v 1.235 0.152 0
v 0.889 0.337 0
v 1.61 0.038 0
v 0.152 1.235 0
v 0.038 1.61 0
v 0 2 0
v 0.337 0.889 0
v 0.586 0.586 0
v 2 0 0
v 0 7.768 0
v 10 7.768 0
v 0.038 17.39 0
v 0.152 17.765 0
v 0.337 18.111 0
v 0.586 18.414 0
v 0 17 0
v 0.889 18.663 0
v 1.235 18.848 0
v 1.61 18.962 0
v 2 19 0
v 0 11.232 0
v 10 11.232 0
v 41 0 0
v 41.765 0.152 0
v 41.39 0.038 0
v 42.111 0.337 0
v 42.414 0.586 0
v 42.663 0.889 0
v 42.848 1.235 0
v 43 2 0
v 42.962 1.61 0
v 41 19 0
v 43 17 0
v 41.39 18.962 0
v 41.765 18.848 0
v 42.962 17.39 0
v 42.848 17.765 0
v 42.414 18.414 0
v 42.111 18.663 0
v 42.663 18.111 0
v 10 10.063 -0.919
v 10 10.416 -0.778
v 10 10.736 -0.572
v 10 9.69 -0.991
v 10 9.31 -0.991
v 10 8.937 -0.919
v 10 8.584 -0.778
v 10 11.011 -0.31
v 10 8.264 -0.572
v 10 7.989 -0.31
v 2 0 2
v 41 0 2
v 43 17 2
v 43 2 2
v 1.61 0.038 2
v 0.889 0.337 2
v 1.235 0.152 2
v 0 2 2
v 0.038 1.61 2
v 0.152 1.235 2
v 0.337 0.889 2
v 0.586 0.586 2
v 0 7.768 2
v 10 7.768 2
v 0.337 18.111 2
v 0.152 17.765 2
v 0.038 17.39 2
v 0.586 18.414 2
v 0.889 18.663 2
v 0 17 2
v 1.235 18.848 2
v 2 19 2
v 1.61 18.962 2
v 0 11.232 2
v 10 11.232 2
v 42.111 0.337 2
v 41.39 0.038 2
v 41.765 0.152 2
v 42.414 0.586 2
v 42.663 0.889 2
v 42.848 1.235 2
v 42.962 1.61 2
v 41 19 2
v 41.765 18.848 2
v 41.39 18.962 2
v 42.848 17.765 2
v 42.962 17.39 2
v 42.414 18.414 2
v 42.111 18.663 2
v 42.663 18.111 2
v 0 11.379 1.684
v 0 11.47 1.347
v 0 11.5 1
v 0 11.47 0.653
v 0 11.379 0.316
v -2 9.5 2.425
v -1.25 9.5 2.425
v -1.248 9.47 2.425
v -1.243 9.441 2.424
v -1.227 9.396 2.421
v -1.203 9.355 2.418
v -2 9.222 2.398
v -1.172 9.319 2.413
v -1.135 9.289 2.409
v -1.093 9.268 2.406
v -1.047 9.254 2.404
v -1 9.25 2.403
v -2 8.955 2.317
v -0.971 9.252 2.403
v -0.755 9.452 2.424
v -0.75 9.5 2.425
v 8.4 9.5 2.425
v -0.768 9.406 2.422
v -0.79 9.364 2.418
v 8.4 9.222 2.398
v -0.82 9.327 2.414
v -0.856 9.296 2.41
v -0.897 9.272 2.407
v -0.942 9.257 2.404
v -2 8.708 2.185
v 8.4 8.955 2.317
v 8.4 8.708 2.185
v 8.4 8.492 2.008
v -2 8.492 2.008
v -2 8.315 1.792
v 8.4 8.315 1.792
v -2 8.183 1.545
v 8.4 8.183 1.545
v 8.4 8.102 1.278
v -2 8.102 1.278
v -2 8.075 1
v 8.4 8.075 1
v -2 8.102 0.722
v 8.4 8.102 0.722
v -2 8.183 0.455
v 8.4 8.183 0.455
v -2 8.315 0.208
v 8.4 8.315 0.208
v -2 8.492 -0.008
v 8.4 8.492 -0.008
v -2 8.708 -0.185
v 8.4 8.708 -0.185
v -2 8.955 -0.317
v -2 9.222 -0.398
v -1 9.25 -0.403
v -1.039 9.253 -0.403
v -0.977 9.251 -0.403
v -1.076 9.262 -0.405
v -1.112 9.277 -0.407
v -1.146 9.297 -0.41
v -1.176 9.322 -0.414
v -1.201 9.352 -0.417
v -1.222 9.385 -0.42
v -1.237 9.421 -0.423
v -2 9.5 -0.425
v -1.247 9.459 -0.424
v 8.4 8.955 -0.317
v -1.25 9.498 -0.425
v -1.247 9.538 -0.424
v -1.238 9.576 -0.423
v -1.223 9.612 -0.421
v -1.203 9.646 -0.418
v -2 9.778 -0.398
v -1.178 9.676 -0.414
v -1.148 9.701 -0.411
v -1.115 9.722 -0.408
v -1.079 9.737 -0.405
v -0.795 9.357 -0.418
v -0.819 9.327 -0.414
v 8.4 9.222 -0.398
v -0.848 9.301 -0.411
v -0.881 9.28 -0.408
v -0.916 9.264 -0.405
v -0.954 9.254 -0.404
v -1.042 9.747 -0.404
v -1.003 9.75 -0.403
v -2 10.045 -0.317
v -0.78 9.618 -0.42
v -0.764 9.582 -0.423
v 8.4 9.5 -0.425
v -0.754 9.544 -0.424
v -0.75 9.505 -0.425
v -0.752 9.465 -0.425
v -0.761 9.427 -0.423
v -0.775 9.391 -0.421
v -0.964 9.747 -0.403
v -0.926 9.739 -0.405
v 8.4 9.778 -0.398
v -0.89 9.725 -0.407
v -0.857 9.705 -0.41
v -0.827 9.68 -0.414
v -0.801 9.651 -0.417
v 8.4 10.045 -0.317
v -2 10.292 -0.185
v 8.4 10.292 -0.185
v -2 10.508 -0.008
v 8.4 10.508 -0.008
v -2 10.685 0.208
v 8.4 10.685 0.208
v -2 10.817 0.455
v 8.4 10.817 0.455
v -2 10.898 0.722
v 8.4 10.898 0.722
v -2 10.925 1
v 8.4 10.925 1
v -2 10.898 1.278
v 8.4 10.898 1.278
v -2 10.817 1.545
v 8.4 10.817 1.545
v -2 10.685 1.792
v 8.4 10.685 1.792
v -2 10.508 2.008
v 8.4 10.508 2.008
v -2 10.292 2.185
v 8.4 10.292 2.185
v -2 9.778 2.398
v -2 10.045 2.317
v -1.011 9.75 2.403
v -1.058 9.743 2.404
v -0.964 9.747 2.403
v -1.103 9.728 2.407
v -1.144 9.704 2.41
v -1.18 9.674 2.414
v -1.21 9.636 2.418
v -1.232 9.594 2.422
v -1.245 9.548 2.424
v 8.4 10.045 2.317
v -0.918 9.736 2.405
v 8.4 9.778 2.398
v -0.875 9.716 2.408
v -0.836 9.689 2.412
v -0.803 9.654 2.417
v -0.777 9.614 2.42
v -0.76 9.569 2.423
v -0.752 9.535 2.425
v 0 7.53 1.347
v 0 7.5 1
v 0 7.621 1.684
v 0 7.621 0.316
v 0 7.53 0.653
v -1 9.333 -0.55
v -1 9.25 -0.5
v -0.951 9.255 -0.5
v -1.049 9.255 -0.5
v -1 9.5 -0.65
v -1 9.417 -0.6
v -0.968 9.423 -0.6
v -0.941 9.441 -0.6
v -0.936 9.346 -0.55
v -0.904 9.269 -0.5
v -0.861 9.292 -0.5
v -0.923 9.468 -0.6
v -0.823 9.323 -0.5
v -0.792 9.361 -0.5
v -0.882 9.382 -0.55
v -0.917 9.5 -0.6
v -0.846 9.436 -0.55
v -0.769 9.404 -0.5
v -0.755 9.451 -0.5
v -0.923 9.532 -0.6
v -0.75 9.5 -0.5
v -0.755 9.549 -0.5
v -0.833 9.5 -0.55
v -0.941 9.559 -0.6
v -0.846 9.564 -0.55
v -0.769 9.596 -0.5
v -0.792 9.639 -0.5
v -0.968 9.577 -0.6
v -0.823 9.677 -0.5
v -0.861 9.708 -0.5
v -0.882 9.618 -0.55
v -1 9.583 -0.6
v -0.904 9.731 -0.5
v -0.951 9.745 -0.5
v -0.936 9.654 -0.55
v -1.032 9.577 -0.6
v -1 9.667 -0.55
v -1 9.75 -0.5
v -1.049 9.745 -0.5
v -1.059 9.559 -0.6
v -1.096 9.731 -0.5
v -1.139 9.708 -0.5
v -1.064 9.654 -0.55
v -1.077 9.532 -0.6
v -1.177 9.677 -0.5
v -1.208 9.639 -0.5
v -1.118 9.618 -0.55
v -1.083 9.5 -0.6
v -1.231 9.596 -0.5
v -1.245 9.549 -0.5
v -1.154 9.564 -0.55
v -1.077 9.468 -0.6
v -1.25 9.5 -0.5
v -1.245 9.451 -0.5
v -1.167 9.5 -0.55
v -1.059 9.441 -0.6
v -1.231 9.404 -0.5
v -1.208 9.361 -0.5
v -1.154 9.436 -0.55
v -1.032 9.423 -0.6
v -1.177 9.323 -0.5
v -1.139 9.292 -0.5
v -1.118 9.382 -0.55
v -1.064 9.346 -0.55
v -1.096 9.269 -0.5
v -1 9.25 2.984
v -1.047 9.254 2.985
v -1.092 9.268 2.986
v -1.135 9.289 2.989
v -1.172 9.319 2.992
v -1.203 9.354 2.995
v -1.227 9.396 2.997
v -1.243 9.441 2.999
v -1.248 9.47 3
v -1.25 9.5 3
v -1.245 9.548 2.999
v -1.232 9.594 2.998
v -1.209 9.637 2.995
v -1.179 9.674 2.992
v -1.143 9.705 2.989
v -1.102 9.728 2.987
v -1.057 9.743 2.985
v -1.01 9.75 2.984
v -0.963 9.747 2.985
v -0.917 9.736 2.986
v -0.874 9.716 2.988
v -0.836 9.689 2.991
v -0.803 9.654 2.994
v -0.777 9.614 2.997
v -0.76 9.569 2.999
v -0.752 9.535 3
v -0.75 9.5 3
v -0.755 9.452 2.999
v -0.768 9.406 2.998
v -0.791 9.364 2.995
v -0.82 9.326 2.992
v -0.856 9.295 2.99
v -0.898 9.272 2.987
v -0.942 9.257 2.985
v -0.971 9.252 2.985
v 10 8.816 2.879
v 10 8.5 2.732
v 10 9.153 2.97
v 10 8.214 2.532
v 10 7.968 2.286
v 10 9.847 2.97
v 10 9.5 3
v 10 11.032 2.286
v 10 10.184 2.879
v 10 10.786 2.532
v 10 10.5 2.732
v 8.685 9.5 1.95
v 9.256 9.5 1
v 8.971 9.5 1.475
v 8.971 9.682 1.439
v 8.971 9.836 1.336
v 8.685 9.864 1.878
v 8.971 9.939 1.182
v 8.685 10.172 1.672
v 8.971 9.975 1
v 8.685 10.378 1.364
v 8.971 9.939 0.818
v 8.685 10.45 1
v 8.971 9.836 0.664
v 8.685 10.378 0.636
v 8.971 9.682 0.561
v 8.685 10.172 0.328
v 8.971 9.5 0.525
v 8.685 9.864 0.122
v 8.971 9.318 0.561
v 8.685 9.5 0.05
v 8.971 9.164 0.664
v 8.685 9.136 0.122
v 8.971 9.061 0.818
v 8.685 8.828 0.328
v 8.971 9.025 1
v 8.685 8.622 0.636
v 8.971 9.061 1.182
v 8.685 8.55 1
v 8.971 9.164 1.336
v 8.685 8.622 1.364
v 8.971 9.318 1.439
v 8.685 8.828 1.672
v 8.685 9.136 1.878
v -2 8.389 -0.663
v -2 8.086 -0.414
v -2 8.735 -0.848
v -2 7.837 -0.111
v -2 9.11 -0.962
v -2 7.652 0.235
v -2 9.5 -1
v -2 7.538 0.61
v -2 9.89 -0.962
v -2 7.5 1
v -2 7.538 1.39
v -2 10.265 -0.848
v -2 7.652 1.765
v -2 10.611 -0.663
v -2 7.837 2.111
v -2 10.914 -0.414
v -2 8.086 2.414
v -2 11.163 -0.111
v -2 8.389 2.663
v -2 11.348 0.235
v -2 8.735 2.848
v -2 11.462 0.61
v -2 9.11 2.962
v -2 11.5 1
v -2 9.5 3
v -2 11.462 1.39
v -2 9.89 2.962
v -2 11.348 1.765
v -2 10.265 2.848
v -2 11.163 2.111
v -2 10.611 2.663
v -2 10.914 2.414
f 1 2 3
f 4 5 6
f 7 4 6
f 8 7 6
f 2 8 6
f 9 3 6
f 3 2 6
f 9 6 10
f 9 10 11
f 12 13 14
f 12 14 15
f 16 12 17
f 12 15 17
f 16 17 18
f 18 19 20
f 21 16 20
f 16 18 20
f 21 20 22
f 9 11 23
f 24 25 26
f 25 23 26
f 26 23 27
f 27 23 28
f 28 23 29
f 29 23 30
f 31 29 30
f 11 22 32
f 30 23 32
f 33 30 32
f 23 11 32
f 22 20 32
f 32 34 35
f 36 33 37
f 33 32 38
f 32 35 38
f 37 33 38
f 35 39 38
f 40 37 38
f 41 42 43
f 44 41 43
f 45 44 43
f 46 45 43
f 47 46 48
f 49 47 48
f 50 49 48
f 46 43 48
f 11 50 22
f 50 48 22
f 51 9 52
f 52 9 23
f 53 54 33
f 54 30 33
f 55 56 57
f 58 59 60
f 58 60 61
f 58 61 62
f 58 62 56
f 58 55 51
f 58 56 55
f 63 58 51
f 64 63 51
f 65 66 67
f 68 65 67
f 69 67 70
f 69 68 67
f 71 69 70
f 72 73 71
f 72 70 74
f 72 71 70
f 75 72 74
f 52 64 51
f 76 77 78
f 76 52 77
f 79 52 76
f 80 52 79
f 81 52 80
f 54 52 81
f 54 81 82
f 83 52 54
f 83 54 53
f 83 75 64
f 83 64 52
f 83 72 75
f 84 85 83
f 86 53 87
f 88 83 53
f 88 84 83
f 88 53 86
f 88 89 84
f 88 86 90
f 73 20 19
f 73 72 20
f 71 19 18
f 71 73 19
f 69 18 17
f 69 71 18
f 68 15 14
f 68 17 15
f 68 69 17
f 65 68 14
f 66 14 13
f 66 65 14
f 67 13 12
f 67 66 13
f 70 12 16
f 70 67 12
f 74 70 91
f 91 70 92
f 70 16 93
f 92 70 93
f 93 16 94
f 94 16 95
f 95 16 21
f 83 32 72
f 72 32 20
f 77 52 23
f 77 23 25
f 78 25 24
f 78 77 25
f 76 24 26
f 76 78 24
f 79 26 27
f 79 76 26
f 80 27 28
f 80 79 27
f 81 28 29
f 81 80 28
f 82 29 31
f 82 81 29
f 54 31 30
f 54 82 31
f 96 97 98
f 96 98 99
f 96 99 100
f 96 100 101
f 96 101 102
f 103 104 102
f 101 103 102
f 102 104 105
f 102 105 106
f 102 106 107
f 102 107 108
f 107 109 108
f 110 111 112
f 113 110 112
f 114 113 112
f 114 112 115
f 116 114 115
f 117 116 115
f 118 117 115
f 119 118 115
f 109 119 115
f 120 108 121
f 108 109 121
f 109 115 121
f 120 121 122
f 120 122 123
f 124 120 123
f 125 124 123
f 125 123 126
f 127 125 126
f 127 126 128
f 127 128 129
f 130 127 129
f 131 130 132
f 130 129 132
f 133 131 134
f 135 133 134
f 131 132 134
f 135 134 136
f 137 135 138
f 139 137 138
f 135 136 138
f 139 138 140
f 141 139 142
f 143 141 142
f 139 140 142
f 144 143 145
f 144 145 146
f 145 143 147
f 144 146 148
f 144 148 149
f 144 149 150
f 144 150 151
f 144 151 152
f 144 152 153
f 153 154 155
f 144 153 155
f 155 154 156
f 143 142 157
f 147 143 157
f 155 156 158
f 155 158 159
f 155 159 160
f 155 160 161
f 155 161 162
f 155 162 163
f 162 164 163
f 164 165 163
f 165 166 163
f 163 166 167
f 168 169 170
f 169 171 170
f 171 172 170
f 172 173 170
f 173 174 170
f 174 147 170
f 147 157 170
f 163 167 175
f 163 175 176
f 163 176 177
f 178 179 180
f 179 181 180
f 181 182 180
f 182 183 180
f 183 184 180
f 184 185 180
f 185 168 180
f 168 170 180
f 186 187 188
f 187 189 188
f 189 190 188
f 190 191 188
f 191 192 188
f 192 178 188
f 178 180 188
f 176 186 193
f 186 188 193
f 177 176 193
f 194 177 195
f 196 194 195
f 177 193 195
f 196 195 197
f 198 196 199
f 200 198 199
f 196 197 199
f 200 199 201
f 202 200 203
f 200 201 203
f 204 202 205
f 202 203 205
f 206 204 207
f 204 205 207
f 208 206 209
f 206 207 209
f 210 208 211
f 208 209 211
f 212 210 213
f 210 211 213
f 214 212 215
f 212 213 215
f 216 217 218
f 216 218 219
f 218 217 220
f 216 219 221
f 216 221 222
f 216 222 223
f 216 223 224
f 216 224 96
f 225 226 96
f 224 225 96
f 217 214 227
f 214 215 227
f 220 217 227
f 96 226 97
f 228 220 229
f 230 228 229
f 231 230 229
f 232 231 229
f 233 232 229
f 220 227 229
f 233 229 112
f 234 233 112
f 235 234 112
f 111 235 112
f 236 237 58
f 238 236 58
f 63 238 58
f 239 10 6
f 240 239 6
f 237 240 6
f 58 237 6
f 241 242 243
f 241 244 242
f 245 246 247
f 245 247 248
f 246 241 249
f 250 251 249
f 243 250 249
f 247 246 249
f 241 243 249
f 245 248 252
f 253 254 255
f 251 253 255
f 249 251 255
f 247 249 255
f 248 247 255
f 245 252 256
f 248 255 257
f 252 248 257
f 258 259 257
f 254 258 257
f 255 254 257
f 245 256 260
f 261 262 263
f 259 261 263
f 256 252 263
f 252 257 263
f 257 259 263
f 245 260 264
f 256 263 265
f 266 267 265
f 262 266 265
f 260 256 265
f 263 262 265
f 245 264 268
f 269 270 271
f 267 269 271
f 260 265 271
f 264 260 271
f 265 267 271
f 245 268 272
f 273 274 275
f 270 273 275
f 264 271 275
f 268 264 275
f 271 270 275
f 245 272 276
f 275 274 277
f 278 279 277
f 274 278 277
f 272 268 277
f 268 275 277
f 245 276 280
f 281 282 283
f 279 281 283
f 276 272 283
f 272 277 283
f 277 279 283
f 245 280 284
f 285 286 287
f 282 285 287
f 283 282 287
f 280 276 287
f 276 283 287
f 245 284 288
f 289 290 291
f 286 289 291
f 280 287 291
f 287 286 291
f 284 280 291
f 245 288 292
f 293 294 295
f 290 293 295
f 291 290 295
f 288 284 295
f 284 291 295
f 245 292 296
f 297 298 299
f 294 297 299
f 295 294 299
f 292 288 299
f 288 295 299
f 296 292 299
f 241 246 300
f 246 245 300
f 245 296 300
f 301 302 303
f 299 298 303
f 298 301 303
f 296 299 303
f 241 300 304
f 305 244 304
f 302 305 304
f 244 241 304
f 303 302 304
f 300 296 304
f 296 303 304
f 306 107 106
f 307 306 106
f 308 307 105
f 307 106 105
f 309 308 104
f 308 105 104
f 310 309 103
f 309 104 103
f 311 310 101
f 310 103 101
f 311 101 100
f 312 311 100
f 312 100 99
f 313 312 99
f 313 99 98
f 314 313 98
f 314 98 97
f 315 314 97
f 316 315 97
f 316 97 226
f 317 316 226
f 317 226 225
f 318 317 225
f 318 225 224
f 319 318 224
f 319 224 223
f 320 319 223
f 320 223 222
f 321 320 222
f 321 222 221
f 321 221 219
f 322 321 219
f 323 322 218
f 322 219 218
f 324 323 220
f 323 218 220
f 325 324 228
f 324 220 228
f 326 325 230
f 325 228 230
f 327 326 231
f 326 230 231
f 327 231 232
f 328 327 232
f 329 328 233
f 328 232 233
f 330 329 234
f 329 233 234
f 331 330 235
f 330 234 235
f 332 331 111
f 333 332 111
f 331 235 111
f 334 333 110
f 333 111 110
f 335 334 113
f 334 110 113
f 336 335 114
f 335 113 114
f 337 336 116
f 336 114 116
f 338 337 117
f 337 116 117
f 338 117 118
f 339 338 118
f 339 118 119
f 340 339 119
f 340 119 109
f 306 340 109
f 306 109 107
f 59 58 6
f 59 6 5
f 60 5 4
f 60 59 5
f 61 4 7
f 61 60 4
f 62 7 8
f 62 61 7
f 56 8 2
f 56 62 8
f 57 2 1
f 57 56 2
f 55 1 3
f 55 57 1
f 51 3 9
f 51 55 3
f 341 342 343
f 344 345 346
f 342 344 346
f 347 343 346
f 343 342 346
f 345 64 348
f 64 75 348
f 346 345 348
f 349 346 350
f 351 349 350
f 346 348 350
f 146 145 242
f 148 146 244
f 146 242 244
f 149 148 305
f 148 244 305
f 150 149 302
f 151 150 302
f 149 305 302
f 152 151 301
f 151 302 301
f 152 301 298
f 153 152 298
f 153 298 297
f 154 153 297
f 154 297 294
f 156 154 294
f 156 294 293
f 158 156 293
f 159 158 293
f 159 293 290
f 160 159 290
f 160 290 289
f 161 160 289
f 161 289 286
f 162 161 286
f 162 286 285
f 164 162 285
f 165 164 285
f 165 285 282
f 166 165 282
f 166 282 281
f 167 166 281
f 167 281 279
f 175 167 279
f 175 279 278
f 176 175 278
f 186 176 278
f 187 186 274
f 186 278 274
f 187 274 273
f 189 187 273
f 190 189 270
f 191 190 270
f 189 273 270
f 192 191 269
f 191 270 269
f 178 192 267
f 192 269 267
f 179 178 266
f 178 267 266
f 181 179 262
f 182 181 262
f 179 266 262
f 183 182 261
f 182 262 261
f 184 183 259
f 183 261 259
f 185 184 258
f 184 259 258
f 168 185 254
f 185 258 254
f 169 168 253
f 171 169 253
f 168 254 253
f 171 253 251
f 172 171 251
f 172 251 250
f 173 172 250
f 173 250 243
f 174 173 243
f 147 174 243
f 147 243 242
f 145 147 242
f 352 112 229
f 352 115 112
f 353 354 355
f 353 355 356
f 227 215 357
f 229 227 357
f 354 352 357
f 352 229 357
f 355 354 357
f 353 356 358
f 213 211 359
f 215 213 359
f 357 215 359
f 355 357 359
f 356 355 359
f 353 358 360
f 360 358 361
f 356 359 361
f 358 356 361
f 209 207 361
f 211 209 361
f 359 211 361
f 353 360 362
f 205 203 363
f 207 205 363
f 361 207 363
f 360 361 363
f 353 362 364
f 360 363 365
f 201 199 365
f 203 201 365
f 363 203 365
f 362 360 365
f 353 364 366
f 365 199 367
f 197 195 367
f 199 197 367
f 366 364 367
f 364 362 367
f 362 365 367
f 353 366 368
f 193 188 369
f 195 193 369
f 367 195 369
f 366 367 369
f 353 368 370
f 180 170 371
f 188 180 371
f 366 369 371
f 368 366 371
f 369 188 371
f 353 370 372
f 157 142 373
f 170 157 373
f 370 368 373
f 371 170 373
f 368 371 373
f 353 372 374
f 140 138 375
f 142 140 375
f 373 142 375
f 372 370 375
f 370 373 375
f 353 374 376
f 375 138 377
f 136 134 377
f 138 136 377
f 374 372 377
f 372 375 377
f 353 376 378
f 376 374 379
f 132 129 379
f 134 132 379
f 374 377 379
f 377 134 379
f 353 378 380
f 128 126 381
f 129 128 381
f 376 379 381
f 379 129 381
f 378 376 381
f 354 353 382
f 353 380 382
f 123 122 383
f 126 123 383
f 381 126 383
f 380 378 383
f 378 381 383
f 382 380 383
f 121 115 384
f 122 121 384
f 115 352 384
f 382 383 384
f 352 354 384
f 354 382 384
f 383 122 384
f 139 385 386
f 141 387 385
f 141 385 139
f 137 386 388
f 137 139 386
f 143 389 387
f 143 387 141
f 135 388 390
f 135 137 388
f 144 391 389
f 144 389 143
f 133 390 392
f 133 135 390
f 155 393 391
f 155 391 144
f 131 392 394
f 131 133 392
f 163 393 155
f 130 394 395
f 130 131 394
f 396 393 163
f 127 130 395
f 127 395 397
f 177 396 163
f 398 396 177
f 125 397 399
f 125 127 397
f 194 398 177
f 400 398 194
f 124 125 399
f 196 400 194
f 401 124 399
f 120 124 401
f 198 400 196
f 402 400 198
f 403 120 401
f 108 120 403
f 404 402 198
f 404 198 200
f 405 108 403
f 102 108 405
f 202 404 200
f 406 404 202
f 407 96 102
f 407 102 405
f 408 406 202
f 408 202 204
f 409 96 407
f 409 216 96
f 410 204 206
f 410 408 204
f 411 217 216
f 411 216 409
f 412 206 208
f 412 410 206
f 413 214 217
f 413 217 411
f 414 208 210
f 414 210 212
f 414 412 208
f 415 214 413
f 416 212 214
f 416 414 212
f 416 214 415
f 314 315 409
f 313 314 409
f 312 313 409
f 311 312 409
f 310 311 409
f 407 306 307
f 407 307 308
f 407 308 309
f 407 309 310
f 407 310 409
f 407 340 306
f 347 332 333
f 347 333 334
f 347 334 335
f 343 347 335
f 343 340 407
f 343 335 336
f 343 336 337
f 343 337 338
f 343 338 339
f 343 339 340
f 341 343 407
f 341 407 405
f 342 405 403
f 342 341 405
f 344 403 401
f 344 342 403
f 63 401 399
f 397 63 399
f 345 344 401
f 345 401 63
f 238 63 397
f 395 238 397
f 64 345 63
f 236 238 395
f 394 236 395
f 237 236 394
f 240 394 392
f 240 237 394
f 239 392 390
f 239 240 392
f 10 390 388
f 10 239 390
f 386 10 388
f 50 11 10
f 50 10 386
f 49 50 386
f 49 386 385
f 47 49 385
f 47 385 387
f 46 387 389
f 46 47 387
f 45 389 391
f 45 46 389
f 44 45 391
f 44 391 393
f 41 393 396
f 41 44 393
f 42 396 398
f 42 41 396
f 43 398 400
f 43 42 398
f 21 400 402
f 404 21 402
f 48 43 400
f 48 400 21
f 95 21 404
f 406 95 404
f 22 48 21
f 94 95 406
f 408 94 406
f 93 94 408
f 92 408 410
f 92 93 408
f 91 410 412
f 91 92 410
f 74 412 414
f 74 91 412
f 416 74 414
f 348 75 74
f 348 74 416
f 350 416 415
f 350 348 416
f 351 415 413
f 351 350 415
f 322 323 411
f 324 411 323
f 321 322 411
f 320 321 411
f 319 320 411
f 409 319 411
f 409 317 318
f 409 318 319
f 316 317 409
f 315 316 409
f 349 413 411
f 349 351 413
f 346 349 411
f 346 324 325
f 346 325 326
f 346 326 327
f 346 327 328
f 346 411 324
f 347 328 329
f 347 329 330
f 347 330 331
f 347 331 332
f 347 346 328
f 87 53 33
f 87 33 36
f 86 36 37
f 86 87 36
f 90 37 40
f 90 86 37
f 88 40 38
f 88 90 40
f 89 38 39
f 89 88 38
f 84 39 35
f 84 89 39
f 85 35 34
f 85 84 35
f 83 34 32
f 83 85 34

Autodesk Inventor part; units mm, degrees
ref_plane "YZ Plane" through (0, 0, 0) normal (1, 0, 0) x (0, 1, 0)
ref_plane "XZ Plane" through (0, 0, 0) normal (0, 1, 0) x (-1, 0, 0)
sketch "Sketch1" plane through (0, 0, 0) normal (0, 0, 1) x (1, 0, 0)
  line L0 (0, 0) -> (43, 0)
  line L1 (43, 0) -> (43, 19)
  line L2 (43, 19) -> (0, 19)
  line L3 (0, 19) -> (0, 0)
  dimension "d0" = 43
extrude "Extrusion1" add sketch "Sketch1" along normal blind 2
fillet "Fillet1" radius 2 4 edges at (43, 19, 1) (43, 0, 1) (0, 19, 1) (0, 0, 1)
sketch "Sketch3" plane through (0, 2, 0) normal (-1, 0, 0) x (0, 0, 1)
  line L0 (2, 0) -> (0, 0) construction
  line L1 (2, 15) -> (2, 0) construction
  line L2 (0, 0) -> (2, 15) construction
  line L3 (0, 15) -> (2, 0) construction
  circle A0 centre (1, 7.5) radius 2
  point P0 (0, -2)
  dimension "d4" = 4
extrude "Extrusion2" add sketch "Sketch3" along normal blind 2 and the other way blind 10
sketch "Sketch4" plane through (-2, 9.5, 1) normal (-1, 0, 0) x (0, 0, 1)
  point P0 (-1, -9.5)
  point P1 (0, 0)
hole "Hole1" at (-2, 9.5, 1) direction (1, 0, 0) diameter 2.85 depth 10.4 tip angle 118 thread size "M3.5x0.6" class "6H" standard "ANSI Metric M Profile"
ref_plane "Work Plane2" through (0, 0, 3) normal (0, 0, 1) x (1, 0, 0)
ref_plane "Work Plane1" through (0, 0, 1) normal (0, 0, 1) x (1, 0, 0)
sketch "Sketch6" plane through (0, 0, 3) normal (0, 0, 1) x (1, 0, 0)
  line L0 (-2, 11.5) -> (-2, 7.5) construction
  line L1 (0, 7.5) -> (0, 7.7679) construction
  line L2 (-2, 11.5) -> (0, 7.5) construction
  line L3 (0, 7.5) -> (-2, 7.5) construction
  line L4 (-2, 7.5) -> (0, 11.5) construction
  line L5 (0, 11.5) -> (-2, 11.5) construction
  point P0 (0, 0)
  point P1 (-1, 9.5)
hole "Hole2" at (-1, 9.5, 3) direction (0, 0, -1) diameter 0.5 depth 3.5 tip angle 118
properties part number "UntererRührer"
